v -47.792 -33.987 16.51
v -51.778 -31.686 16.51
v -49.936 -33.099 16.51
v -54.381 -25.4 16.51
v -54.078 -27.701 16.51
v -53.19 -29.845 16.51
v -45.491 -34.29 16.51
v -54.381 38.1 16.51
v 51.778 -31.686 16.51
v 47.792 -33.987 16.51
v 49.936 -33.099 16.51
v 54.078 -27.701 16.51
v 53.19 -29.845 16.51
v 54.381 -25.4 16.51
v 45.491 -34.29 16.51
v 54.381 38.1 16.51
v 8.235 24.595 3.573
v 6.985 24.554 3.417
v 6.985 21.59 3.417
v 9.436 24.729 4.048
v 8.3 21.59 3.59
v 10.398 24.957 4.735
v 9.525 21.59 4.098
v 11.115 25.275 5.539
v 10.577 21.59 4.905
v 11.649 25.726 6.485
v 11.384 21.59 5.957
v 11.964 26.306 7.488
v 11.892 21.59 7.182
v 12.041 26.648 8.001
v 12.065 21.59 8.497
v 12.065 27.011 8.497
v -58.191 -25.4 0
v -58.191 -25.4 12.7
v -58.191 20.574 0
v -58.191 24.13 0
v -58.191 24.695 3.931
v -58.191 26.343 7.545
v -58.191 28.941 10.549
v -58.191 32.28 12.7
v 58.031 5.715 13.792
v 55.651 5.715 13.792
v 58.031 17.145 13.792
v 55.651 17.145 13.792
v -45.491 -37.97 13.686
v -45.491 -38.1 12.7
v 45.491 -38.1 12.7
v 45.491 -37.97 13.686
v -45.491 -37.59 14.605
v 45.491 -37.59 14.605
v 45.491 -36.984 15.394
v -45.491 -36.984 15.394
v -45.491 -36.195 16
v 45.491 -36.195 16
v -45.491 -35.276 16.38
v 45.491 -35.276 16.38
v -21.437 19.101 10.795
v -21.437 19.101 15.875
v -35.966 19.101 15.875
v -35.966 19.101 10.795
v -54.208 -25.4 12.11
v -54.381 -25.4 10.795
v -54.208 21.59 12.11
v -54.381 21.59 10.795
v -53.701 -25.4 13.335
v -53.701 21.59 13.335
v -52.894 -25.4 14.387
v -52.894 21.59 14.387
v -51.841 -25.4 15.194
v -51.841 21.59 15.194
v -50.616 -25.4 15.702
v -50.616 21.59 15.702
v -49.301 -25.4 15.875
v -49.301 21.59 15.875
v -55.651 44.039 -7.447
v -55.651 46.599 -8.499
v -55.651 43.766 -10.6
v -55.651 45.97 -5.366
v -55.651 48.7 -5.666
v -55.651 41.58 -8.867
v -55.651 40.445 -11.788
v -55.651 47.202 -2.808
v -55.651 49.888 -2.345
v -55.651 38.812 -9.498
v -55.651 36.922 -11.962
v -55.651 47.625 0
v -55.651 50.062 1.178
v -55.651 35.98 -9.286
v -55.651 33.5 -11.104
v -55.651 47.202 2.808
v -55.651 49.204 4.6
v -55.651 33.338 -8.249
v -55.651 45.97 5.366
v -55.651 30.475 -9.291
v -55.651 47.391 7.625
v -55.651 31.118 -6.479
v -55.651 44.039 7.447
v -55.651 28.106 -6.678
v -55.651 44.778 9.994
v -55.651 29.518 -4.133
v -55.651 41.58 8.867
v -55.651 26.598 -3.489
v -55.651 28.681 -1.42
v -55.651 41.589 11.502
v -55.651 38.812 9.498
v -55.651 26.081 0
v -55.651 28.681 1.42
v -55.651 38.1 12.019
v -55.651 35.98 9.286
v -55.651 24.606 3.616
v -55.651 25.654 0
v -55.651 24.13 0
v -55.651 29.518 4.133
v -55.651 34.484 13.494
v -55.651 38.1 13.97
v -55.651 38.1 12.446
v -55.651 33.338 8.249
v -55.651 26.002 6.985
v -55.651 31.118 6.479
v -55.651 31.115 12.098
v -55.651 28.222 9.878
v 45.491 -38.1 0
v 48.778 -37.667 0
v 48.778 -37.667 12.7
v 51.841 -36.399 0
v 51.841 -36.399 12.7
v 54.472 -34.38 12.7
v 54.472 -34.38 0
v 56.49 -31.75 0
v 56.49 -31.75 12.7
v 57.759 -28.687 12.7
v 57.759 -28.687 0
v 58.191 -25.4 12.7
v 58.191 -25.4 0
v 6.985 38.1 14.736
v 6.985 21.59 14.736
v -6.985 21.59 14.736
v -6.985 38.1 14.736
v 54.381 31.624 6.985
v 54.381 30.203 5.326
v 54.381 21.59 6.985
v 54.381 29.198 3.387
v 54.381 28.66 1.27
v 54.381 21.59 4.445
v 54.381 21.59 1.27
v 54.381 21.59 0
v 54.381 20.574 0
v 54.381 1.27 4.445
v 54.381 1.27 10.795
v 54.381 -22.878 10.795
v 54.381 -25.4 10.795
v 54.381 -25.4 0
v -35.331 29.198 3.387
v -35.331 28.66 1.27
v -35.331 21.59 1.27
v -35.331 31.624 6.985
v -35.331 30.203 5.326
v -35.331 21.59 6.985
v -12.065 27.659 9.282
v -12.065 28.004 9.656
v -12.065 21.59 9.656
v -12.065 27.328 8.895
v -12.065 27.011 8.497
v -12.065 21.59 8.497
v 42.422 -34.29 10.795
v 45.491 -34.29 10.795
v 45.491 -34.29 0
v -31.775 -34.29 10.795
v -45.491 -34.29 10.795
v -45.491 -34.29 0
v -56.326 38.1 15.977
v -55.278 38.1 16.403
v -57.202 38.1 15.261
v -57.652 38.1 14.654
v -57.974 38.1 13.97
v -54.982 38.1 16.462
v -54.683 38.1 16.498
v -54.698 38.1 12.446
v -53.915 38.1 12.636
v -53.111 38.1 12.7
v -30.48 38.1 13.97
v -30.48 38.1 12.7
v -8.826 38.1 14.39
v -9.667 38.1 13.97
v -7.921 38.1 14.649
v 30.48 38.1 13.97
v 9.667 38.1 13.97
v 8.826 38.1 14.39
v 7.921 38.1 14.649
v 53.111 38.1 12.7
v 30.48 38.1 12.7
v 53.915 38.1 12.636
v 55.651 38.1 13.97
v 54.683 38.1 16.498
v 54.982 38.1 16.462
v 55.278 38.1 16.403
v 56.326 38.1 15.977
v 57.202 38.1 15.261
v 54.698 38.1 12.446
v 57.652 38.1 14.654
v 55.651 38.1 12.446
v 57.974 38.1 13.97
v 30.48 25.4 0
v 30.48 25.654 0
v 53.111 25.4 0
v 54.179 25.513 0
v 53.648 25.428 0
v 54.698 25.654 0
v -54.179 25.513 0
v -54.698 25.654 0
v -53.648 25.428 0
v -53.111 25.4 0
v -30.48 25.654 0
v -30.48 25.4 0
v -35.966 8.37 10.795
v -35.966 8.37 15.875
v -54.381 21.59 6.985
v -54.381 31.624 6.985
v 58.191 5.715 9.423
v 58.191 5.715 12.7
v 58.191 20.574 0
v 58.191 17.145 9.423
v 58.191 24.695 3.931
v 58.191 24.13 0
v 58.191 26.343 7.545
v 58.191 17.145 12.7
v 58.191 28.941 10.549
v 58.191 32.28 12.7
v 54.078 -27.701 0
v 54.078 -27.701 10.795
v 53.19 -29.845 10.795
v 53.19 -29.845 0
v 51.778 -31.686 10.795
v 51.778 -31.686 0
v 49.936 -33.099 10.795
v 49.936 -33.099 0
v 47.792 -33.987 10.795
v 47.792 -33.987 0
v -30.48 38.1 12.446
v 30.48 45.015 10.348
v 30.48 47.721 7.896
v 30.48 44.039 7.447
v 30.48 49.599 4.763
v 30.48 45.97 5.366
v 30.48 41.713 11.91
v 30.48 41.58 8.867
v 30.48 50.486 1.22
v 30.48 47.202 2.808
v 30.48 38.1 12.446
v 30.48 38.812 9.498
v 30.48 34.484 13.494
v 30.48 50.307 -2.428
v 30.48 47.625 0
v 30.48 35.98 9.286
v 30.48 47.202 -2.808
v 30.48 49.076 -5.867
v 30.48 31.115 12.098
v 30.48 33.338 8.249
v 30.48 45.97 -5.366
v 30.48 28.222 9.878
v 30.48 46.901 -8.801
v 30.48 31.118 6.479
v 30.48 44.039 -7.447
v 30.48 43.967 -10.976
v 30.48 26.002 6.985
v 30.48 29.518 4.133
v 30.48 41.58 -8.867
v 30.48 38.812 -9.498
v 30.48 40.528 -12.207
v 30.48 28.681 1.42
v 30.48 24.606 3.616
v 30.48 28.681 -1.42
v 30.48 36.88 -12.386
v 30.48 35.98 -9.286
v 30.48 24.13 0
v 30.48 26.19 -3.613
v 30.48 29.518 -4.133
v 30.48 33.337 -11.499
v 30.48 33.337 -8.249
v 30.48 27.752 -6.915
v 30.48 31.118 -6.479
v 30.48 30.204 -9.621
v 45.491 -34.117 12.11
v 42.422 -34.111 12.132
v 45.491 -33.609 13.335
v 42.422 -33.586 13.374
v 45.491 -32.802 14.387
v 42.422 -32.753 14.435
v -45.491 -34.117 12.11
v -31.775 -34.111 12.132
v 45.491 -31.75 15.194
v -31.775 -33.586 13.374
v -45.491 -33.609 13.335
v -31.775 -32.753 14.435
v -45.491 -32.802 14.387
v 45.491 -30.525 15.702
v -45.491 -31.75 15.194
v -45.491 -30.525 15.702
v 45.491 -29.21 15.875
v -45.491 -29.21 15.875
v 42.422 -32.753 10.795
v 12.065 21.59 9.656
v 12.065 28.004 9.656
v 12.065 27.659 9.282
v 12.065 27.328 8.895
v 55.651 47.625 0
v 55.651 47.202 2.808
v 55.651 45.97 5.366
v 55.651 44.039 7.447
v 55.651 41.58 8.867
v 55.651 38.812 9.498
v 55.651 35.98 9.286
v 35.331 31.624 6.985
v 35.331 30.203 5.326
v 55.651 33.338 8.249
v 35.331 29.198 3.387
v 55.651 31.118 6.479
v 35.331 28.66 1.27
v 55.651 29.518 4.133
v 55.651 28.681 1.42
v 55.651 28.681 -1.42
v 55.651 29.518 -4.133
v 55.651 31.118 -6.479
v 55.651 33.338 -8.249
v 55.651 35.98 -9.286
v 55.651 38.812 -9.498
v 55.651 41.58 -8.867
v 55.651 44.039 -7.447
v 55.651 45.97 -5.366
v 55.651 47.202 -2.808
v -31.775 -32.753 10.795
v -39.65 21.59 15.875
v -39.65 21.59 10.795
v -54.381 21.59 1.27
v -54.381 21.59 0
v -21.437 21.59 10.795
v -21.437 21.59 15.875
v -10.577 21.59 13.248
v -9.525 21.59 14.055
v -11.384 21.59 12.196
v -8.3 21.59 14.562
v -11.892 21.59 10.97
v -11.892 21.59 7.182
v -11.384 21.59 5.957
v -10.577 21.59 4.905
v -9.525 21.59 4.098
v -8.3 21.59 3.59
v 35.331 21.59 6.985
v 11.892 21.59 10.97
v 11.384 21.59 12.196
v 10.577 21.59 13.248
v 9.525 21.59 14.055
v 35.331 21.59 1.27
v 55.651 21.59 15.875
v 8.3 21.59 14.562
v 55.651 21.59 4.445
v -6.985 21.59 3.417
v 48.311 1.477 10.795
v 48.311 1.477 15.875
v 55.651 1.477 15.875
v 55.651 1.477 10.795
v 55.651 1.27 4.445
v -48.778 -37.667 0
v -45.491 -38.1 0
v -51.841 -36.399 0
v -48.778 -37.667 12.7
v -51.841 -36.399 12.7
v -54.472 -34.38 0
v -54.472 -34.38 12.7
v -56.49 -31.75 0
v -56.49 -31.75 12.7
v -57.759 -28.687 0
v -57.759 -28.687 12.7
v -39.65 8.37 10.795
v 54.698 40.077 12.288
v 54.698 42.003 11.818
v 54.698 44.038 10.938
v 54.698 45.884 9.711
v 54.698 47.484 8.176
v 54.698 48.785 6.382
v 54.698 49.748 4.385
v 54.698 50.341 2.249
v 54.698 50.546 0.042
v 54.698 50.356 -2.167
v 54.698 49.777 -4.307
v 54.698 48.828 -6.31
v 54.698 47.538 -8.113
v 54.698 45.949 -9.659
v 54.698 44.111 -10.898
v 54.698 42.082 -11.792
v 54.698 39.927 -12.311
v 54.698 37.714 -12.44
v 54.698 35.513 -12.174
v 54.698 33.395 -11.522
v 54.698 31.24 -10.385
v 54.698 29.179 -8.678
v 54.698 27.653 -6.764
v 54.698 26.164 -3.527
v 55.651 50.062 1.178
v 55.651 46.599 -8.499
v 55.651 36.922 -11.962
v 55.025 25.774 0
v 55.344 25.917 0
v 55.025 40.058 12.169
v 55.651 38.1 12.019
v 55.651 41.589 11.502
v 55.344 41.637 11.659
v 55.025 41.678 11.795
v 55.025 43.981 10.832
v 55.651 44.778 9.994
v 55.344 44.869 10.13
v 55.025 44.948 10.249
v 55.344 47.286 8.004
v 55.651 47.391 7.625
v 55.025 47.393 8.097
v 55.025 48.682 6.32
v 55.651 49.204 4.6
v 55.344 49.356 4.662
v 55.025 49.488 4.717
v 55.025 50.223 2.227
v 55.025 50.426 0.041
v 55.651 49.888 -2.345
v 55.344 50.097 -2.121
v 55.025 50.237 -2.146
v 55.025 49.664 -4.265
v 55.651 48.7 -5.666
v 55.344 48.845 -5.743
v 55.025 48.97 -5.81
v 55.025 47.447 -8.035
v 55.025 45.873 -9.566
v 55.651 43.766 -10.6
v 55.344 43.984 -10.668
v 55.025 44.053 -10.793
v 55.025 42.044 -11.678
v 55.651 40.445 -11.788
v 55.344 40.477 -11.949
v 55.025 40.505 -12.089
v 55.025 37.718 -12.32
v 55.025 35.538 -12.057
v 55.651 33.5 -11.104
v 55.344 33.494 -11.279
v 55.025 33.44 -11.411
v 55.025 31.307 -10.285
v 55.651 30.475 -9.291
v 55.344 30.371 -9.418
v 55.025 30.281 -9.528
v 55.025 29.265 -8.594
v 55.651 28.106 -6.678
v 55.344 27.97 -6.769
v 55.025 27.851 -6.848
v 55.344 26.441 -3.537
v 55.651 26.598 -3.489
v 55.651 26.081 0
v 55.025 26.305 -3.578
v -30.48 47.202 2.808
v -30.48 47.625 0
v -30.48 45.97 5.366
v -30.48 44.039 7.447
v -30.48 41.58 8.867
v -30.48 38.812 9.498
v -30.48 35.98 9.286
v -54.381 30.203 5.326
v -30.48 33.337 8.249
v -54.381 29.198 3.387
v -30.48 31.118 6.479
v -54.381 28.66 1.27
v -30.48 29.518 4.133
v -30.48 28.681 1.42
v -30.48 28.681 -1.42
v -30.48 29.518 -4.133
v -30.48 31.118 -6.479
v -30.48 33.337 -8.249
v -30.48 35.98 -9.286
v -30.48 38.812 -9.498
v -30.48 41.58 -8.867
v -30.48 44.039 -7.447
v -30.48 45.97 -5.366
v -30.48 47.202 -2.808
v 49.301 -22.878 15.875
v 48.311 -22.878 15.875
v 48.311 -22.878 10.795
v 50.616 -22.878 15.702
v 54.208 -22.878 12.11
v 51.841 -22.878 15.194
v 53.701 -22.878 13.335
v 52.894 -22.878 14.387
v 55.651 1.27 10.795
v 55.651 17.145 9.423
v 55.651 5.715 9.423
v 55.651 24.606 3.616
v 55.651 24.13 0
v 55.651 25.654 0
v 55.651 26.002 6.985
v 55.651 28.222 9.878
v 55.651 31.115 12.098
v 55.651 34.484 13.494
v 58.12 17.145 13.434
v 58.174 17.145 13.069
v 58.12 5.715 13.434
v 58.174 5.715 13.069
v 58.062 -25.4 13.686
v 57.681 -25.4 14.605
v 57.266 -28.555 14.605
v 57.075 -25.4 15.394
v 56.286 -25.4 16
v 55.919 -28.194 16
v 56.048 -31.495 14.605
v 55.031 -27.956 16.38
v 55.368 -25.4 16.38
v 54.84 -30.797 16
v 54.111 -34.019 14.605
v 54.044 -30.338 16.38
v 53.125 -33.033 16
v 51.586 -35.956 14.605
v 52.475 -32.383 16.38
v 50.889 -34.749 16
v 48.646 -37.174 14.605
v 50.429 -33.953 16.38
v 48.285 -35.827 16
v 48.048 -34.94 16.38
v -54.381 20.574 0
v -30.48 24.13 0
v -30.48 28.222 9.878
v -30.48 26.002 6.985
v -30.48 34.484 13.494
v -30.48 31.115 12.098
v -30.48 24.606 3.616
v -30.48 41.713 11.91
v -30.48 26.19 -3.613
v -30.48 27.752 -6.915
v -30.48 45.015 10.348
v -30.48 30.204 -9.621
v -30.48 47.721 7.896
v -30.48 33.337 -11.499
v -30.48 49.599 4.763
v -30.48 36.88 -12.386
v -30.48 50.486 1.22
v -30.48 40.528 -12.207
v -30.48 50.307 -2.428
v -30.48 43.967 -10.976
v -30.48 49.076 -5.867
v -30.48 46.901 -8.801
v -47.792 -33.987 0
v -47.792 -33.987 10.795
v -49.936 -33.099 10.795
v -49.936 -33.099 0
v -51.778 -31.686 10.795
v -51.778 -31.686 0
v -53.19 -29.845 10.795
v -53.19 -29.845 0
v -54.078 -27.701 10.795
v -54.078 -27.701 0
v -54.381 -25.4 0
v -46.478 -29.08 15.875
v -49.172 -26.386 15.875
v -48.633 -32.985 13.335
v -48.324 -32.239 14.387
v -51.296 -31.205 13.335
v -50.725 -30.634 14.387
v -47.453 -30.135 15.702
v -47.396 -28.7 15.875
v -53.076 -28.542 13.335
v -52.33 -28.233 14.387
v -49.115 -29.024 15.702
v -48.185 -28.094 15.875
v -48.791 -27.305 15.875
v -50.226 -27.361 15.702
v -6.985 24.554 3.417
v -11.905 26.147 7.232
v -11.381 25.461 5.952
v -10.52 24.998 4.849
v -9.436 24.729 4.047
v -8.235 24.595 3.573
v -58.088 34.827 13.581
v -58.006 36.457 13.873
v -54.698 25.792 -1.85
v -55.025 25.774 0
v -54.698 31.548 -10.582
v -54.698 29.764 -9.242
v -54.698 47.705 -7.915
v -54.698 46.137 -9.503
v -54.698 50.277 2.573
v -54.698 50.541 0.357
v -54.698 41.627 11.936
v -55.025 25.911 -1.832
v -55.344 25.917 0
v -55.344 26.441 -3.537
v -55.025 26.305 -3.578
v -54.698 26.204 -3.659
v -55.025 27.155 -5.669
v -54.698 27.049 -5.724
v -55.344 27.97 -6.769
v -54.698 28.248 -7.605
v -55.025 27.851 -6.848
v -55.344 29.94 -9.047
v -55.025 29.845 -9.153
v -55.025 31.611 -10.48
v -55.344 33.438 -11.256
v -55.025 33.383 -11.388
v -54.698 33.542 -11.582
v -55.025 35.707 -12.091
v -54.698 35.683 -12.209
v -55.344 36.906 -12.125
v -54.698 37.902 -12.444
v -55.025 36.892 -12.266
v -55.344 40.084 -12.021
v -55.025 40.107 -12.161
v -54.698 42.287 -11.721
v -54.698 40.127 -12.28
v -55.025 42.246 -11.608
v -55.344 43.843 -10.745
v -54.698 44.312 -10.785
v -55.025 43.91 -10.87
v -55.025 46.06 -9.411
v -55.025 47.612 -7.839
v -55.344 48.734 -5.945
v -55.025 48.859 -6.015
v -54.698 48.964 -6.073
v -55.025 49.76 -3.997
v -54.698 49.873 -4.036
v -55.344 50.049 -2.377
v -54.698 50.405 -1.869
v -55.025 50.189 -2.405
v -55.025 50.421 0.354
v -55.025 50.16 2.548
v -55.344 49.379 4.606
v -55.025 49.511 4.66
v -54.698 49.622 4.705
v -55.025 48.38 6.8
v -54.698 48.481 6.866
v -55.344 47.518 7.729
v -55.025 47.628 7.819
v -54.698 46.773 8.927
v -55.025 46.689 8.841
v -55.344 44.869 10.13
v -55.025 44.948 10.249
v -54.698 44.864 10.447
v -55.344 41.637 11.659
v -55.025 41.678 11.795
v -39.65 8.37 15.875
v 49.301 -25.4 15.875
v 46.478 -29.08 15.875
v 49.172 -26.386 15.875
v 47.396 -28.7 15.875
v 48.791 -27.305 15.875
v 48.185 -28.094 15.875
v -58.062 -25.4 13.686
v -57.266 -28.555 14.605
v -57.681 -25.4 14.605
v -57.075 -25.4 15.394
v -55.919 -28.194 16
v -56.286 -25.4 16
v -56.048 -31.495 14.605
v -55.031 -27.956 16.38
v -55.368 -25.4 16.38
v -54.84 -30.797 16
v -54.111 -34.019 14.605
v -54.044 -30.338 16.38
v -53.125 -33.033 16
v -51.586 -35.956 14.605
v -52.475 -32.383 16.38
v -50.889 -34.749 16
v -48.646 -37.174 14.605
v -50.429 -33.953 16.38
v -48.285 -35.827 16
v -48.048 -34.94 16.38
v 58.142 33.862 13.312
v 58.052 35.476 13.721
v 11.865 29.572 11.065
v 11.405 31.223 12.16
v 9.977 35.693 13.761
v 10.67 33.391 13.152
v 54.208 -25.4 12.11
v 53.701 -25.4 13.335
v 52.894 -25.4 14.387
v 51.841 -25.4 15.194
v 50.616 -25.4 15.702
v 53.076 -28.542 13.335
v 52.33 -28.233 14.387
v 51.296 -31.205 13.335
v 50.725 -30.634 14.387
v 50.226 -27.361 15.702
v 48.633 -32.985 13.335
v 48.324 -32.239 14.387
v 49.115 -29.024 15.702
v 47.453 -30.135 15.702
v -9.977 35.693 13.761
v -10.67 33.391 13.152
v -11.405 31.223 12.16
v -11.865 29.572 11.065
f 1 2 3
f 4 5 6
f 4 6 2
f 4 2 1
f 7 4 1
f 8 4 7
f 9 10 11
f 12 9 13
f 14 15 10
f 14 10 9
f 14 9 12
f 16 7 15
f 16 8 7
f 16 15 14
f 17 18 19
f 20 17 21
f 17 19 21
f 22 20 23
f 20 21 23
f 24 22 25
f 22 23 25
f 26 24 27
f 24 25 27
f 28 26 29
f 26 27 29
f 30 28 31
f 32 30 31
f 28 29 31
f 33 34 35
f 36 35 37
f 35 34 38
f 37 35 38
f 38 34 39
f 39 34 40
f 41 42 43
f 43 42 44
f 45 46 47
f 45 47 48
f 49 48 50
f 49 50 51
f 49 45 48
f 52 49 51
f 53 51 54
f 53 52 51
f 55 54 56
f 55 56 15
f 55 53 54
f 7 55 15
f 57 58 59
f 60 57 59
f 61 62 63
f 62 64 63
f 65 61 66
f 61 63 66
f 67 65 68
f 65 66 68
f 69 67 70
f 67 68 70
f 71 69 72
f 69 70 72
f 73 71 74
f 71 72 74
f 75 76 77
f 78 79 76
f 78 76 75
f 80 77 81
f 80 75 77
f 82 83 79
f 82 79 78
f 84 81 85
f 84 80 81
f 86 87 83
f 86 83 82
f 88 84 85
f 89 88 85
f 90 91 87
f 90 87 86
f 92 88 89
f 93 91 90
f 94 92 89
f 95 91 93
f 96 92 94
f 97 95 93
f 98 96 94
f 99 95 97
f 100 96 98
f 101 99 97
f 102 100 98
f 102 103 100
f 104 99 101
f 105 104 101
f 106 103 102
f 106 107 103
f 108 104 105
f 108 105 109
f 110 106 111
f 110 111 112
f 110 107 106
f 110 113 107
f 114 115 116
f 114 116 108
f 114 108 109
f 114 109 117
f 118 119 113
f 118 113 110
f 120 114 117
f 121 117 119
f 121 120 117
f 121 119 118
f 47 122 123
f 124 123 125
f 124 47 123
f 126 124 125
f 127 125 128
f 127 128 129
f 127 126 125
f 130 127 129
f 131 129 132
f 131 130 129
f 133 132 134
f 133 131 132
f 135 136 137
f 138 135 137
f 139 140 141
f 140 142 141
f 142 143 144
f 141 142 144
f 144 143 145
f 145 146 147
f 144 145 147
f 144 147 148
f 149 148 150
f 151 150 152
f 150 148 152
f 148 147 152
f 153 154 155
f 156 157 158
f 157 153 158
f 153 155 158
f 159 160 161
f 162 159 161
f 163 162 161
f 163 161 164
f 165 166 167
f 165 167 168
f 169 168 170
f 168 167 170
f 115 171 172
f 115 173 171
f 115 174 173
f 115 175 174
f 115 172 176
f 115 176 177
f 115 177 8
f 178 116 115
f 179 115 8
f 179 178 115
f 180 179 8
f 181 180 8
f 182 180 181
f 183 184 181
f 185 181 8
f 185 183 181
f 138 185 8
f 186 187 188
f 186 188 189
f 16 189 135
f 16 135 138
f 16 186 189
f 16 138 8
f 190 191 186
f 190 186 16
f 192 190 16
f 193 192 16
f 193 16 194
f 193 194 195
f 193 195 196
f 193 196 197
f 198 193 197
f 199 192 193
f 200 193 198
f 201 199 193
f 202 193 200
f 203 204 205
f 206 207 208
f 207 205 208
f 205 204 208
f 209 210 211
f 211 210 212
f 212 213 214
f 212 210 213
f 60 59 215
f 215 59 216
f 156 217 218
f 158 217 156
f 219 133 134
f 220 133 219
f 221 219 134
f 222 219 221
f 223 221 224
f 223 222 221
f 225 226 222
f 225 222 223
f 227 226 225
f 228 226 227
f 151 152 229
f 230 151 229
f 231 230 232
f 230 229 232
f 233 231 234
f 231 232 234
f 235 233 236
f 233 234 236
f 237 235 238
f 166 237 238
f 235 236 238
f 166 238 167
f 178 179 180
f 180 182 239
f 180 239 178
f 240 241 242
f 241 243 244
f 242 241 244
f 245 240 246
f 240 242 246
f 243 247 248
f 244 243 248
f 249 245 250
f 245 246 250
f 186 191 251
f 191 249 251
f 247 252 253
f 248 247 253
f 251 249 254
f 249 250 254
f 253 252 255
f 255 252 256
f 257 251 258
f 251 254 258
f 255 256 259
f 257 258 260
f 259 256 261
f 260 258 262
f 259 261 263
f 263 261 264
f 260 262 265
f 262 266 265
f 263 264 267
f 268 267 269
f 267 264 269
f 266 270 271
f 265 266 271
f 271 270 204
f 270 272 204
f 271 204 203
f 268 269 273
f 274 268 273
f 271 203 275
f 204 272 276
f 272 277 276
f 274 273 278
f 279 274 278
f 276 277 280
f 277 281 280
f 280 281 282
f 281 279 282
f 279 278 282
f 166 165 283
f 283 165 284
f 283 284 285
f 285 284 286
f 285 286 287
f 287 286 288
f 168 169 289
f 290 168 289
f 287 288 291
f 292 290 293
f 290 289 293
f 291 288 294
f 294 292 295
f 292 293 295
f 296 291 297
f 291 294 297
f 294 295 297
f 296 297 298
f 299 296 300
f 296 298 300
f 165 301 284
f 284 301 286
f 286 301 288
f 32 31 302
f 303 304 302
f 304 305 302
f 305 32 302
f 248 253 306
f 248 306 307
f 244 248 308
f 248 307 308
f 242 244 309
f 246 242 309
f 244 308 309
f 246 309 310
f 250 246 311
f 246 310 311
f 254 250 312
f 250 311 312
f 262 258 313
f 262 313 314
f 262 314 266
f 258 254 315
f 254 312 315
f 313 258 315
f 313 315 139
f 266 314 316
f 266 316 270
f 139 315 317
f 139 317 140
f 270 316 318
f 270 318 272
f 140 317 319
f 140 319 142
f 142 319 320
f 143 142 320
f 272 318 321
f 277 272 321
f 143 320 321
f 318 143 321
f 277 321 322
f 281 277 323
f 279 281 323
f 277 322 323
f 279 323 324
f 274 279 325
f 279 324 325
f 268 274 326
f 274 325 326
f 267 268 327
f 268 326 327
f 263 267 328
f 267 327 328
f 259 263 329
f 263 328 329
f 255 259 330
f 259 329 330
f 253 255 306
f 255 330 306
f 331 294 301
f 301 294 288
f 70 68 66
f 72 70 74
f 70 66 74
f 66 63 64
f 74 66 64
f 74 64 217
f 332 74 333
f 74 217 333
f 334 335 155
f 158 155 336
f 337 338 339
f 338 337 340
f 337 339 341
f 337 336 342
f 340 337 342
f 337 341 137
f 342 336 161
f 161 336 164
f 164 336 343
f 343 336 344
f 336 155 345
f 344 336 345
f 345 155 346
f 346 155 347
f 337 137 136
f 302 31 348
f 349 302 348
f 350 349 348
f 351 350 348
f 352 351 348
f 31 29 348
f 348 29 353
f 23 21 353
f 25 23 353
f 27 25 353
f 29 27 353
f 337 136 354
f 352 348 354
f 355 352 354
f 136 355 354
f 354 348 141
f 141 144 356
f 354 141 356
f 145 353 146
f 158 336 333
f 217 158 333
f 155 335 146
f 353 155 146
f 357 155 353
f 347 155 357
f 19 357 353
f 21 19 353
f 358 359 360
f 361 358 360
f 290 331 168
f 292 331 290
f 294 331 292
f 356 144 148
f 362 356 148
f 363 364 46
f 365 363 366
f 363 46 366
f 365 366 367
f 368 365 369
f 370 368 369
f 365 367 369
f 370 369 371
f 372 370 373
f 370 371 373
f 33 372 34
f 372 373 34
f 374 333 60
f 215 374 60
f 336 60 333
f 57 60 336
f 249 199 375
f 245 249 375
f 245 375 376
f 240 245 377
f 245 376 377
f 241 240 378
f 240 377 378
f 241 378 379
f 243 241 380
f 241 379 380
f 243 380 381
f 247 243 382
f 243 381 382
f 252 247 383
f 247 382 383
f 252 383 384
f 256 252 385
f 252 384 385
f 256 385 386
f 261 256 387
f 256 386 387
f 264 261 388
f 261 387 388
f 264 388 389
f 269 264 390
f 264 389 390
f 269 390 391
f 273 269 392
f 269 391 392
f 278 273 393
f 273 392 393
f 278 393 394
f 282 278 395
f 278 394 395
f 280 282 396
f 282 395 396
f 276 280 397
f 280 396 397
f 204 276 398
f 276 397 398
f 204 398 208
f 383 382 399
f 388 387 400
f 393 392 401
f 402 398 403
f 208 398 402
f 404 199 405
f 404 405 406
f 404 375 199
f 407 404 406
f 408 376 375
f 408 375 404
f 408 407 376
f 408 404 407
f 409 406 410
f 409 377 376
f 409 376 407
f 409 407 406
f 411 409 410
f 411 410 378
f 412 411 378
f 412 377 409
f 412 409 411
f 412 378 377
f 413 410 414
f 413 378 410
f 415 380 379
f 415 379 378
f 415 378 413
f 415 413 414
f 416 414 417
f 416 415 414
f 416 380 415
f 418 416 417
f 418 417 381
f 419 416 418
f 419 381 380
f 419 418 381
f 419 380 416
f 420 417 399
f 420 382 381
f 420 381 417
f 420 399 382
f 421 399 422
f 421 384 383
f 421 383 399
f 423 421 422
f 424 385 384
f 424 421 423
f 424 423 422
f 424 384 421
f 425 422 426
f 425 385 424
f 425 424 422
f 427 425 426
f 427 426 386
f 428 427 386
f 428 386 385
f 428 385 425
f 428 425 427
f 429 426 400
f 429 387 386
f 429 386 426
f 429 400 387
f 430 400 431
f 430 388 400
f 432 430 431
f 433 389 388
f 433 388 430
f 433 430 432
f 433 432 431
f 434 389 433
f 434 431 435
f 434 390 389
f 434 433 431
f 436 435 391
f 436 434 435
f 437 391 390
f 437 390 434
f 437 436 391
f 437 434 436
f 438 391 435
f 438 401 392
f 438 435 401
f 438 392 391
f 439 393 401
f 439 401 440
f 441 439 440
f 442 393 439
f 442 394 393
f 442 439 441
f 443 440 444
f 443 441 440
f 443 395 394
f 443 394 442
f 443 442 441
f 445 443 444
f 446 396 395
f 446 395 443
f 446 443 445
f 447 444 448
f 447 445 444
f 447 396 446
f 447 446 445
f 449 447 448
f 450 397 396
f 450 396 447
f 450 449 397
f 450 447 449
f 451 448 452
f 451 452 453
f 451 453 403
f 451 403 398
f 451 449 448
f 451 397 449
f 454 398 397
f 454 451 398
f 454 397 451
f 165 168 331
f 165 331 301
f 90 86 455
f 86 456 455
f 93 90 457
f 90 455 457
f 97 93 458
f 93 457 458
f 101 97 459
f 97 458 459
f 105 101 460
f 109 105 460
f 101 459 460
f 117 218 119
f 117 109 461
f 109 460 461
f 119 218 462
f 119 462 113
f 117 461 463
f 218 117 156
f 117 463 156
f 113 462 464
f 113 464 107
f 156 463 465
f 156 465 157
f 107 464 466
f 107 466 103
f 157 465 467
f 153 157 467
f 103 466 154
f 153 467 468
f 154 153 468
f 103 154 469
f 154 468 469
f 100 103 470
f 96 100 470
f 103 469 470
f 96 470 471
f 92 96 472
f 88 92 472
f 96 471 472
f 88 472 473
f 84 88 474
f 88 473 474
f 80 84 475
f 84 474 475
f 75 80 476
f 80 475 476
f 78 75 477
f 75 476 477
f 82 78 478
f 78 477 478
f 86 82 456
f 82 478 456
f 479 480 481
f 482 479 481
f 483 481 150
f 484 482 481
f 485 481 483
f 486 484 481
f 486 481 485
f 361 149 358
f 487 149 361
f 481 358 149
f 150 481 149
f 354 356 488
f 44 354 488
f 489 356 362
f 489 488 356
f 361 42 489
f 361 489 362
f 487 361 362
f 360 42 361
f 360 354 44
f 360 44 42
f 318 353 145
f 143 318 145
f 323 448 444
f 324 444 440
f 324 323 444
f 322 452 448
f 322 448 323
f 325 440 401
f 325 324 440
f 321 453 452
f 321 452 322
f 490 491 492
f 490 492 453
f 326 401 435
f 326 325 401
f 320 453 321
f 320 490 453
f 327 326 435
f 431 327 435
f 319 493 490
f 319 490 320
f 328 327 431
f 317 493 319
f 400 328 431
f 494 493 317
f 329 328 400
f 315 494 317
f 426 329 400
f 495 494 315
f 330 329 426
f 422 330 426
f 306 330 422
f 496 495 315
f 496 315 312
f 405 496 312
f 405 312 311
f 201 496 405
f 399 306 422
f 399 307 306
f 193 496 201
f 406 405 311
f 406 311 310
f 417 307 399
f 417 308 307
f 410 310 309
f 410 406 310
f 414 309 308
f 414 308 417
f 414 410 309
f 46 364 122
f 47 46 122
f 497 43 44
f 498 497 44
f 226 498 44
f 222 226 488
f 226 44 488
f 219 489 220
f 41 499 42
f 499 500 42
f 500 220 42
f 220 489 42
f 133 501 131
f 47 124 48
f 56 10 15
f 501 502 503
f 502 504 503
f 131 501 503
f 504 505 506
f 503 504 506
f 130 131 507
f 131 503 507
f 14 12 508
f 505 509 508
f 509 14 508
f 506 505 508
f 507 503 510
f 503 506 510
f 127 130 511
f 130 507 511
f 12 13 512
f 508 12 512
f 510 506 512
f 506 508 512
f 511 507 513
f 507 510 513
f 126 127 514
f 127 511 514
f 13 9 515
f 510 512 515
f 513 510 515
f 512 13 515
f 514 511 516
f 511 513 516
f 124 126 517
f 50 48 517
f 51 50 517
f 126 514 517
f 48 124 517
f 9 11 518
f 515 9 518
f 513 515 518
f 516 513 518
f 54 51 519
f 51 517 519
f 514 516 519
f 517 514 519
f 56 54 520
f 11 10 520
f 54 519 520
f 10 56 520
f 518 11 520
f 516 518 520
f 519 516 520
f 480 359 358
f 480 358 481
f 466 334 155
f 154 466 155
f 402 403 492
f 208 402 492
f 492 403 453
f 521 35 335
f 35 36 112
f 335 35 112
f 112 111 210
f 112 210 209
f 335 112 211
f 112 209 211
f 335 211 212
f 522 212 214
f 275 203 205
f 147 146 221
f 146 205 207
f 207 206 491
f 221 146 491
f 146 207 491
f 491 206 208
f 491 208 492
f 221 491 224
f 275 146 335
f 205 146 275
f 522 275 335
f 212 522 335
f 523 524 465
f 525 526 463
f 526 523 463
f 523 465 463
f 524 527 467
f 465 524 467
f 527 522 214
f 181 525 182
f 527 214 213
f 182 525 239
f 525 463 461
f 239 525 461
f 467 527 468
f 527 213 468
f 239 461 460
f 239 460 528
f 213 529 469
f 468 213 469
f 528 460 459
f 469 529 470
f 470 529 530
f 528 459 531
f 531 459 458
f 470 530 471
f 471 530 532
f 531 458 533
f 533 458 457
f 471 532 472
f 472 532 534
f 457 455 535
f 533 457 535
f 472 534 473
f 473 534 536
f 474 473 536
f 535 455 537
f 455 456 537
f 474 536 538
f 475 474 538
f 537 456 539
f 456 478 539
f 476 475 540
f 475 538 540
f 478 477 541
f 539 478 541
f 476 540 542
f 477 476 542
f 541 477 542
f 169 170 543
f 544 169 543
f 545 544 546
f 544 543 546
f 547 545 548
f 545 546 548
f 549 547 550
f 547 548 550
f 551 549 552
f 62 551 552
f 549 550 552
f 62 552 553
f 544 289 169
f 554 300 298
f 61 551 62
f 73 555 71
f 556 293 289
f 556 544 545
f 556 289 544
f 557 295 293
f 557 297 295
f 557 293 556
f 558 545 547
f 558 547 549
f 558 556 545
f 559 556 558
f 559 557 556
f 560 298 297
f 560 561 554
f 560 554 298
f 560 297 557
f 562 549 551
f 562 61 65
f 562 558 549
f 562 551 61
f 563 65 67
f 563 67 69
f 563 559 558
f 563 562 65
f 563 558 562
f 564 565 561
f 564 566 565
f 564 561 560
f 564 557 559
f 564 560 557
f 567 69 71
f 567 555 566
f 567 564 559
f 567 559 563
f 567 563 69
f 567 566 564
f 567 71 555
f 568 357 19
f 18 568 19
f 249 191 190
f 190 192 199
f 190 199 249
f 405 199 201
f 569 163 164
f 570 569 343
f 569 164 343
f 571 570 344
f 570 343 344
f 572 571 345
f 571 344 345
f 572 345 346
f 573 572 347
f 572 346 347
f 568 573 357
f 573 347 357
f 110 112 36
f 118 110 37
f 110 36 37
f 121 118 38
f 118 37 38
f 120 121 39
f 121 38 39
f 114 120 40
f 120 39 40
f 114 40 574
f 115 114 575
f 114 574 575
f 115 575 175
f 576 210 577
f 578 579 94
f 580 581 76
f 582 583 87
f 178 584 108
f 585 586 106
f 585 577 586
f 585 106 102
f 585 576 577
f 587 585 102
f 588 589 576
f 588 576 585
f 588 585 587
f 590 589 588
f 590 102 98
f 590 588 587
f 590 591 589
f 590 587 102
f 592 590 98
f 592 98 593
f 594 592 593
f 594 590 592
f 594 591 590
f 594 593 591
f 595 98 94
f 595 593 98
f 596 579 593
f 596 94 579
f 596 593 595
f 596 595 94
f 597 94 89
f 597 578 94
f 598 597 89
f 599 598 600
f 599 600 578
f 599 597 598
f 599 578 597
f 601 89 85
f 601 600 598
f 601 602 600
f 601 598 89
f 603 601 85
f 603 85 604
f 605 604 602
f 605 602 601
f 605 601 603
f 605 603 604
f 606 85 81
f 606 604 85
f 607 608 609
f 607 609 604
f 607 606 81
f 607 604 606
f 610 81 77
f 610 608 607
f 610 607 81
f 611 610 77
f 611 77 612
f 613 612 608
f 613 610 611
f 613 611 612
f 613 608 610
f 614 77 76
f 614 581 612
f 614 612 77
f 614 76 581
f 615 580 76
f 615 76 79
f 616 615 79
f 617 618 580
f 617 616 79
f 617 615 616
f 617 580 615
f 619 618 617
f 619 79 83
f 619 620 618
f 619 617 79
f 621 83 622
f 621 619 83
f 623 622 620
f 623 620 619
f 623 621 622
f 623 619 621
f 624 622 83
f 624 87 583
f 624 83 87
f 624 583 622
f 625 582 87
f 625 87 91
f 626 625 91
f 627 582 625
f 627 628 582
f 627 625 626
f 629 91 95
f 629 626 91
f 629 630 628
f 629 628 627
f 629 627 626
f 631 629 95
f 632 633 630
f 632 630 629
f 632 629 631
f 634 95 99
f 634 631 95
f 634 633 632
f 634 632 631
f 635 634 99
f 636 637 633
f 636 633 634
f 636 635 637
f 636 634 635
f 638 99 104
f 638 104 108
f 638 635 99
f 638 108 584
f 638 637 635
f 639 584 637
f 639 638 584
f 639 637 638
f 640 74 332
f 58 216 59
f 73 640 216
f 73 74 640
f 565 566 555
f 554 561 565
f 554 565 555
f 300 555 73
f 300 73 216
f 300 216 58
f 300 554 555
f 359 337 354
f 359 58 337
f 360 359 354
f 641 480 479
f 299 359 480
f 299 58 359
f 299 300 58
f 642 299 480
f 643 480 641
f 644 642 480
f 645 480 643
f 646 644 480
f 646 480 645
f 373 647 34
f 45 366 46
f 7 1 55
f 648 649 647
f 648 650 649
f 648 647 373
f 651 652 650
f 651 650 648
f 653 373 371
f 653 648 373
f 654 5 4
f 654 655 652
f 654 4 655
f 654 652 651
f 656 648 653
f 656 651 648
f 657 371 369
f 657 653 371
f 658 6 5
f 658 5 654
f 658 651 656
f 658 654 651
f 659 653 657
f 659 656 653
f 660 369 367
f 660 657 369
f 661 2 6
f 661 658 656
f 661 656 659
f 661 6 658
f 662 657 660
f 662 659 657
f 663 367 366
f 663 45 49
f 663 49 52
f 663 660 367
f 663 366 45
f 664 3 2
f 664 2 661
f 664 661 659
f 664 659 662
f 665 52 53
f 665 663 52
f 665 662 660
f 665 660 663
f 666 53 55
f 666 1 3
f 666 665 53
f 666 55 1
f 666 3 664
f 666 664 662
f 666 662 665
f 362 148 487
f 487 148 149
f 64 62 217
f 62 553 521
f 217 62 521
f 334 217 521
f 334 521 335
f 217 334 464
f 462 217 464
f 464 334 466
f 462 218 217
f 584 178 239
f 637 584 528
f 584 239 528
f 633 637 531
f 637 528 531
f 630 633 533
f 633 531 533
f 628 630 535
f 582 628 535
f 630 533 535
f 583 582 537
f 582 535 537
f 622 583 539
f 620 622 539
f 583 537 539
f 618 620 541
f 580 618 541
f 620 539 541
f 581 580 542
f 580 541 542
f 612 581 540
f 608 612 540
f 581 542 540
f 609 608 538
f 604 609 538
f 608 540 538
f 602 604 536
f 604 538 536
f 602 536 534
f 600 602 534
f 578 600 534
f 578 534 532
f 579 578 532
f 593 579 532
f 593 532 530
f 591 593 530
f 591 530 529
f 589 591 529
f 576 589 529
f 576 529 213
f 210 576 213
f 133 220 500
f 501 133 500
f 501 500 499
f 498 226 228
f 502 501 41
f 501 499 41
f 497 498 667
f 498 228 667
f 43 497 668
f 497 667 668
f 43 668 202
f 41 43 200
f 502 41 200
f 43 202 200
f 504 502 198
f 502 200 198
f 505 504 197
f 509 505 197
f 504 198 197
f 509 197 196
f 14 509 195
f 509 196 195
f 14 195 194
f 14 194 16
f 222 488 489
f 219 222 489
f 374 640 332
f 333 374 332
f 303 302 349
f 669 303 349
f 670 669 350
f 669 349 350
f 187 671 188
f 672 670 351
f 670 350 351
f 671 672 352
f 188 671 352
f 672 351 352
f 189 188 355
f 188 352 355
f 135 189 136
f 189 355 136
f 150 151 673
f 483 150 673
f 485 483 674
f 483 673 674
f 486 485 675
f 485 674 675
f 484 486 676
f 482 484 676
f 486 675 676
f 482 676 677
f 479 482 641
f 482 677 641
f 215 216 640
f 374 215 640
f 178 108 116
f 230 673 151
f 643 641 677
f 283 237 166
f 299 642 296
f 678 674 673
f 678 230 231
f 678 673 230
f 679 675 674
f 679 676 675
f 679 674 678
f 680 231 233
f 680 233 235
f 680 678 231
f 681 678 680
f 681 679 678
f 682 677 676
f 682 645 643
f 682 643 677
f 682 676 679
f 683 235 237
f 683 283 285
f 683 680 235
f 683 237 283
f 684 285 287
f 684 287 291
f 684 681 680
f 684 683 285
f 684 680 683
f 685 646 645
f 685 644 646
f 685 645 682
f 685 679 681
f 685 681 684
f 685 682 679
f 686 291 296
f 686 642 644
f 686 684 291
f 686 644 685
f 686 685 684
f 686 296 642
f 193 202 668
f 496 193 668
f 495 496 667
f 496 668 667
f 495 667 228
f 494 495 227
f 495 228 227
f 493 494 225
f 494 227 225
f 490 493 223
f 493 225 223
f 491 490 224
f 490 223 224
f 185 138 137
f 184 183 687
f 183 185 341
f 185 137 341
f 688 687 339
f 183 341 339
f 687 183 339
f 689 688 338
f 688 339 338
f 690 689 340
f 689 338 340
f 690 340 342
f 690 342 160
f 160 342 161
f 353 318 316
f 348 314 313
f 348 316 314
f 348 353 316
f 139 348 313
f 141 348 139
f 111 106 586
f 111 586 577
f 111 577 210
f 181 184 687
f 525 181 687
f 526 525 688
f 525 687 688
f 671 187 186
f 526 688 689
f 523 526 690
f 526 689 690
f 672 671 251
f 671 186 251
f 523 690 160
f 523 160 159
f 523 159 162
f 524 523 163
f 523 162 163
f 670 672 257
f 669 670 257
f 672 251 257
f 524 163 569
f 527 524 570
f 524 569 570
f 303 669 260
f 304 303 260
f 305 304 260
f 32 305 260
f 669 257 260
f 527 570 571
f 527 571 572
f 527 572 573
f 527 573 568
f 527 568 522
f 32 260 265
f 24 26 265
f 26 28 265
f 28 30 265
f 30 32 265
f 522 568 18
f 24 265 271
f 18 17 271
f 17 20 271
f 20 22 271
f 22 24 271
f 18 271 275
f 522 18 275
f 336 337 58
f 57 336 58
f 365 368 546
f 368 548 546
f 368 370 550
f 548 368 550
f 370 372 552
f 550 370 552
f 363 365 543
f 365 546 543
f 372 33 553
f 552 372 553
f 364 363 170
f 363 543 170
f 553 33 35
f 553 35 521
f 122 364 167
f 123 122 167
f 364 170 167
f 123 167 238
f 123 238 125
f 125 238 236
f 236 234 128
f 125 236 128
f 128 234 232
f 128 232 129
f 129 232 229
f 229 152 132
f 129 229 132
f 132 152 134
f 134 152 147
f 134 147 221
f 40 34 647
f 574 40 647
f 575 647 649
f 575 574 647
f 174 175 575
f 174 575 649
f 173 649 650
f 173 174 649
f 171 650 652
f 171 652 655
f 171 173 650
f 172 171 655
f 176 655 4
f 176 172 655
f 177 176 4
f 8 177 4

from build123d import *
from build123d import SkipClean  # not in build123d's __all__

# Parameters (mm, degrees)
F0_W           = 116.3828
F0_H           = 76.2
F1_DEPTH       = 16.51
F2_R           = 12.7
F3_DEPTH       = 58.1914
F4_R           = 12.7
F6_DEPTH       = 15.875
F7_R           = 6.985
F10_DEPTH      = 53.34
F10_DEPTH_BACK = 53.34
F11_W          = 19.05
F11_H          = 5.715
F12_DEPTH      = 17.78
F13_W          = 20.32
F13_H          = 11.43
F14_DEPTH      = 1.27
F16_DEPTH      = 25.4
F17_R          = 5.08
F18_W          = 7.9625188272
F18_H          = 24.355364847
F18_W_2        = 74.197281152
F18_H_2        = 2.5465525687
F19_DEPTH      = 5.08
F20_T1_DEPTH   = 73.025
F20_T3_DEPTH   = 90.9828
F20_T6_ANGLE   = 90
F20_T8_ANGLE   = 90
F21_R          = 5.08
F22_R          = 13.97
F23_DEPTH      = 2.54
F24_R          = 13.97
F25_DEPTH      = 2.54
F26_R          = 9.525
F27_DEPTH      = 63.5
F29_DEPTH      = 25.4
F31_DEPTH      = 63.5


# Not quite as in the source:
# - a fillet or chamfer that OpenCascade refuses, or shapes differently, is made with other operations: its cross-section is extruded or revolved along the edge and cut away or added


with BuildPart() as f1:
    # F0 (on Top) → F1 (new body)
    with BuildSketch(Plane.XY):
        Rectangle(F0_W, F0_H)
    extrude(amount=F1_DEPTH)

    # F2 (on Right) → F3 (join, symmetric)
    with BuildSketch(Plane.YZ):
        with Locations((38.1, 0)):
            Circle(F2_R)
    extrude(amount=F3_DEPTH, both=True)

    # F4
    f4_edges = [f1.edges().sort_by_distance(p)[0] for p in [
        (-58.1914, -38.1, 8.255),
        (58.1914, -38.1, 8.255),
    ]]
    fillet(f4_edges, radius=F4_R)

    # F5 (on face) → F6 (cut)
    with BuildSketch(Plane(origin=(0, 0, 0), x_dir=(1, 0, 0), z_dir=(0, 0, -1))):
        with BuildLine():
            Line((-54.3814, 25.4), (-54.3814, -21.59))
            Line((-54.3814, -21.59), (54.3814, -21.59))
            Line((54.3814, -21.59), (54.3814, 25.4))
            ThreePointArc((54.3814, 25.4), (51.7775792847, 31.6861792847), (45.4914, 34.29))
            Line((45.4914, 34.29), (-45.4914, 34.29))
            ThreePointArc((-45.4914, 34.29), (-51.7775792847, 31.6861792847), (-54.3814, 25.4))
        make_face()
    extrude(amount=-F6_DEPTH, mode=Mode.SUBTRACT)

    # F8 (on Top) → F9 (revolve, cut)
    with BuildSketch(Plane.XY):
        Polygon((-30.48, 28.575), (-30.48, 25.4), (-30.48, 24.13), (30.48, 24.13), (30.48, 25.4), (30.48, 28.575), (24.13, 28.575), (19.05, 28.575), (19.05, 38.1), (0, 38.1), (-19.05, 38.1), (-19.05, 28.575), (-24.13, 28.575), align=None)
    revolve(axis=Axis((-9.525, 38.1, 0), (1, 0, 0)), mode=Mode.SUBTRACT)

    # F7 (on Right) → F10 (cut, two sides)
    with BuildSketch(Plane.YZ) as f10_sk:
        with Locations((38.1, 0)):
            Circle(F7_R)
    extrude(amount=F10_DEPTH, mode=Mode.SUBTRACT)
    extrude(f10_sk.sketch, amount=-F10_DEPTH_BACK, mode=Mode.SUBTRACT)

    # F11 (on face) → F12 (cut)
    with BuildSketch(Plane.XZ.offset(-21.59)):
        with Locations((44.8564, 4.1275)):
            Rectangle(F11_W, F11_H)
        with Locations((-44.8564, 4.1275)):
            Rectangle(F11_W, F11_H)
    extrude(amount=-F12_DEPTH, mode=Mode.SUBTRACT)

    # F13 (on face) → F14 (cut)
    with BuildSketch(Plane(origin=(54.3814, 0, 0), x_dir=(0, -1, 0), z_dir=(-1, 0, 0))):
        with Locations((-11.43, 10.16)):
            Rectangle(F13_W, F13_H)
    extrude(amount=-F14_DEPTH, mode=Mode.SUBTRACT)

    # F15 (on face) → F16 (cut)
    with BuildSketch(Plane(origin=(55.6514, 0, 0), x_dir=(0, -1, 0), z_dir=(-1, 0, 0))):
        Polygon((-17.145, 9.4234), (-5.715, 9.4234), (-5.715, 13.7922), (-11.43, 13.7922), (-17.145, 13.7922), align=None)
    extrude(amount=-F16_DEPTH, mode=Mode.SUBTRACT)

    # F17
    f17_edges = [f1.edges().sort_by_distance(p)[0] for p in [
        (-54.3814, -1.905, 15.875),
    ]]
    fillet(f17_edges, radius=F17_R)

    # F18 (on face) → F19 (join)
    with BuildSketch(Plane(origin=(0, 0, 15.875), x_dir=(1, 0, 0), z_dir=(0, 0, -1))):
        with Locations((52.2920594136, 10.7005844475)):
            Rectangle(F18_W, F18_H)
        Polygon((-35.9664, -19.1008), (-35.9664, -8.3696618676), (-39.6496931181, -8.3696618676), (-39.6496931181, -22.3802613997), (-21.43734819, -22.3802613997), (-21.43734819, -19.1008), align=None)
        with Locations((5.3238477558, 34.0265762843)):
            Rectangle(F18_W_2, F18_H_2)
    extrude(amount=F19_DEPTH)

    # F20: fillet of radius 3.81 on 1 edges, made by hand

    # F20_s2 → F20_t1 (cut)
    with BuildSketch(Plane.XZ.offset(-47.625)):
        with BuildLine():
            ThreePointArc((-58.1914, 12.7), (-57.0754768363, 15.3940768363), (-54.3814, 16.51))
            Line((-54.3814, 16.51), (-58.1914, 16.51))
            Line((-58.1914, 16.51), (-58.1914, 12.7))
        make_face()
        with BuildLine():
            ThreePointArc((58.1914, 12.7), (57.0754768363, 15.3940768363), (54.3814, 16.51))
            Line((54.3814, 16.51), (58.1914, 16.51))
            Line((58.1914, 16.51), (58.1914, 12.7))
        make_face()
    extrude(amount=F20_T1_DEPTH, mode=Mode.SUBTRACT)

    # F20_s4 → F20_t3 (cut)
    with BuildSketch(Plane.YZ.offset(-45.4914)):
        with BuildLine():
            ThreePointArc((-38.1, 12.7), (-36.9840768363, 15.3940768363), (-34.29, 16.51))
            Line((-34.29, 16.51), (-38.1, 16.51))
            Line((-38.1, 16.51), (-38.1, 12.7))
        make_face()
    extrude(amount=F20_T3_DEPTH, mode=Mode.SUBTRACT)

    # F20_s5 → F20_t6 (revolve, cut)
    with BuildSketch(Plane.XZ.offset(25.4)):
        with BuildLine():
            ThreePointArc((-58.1914, 12.7), (-57.0754768363, 15.3940768363), (-54.3814, 16.51))
            Line((-54.3814, 16.51), (-58.1914, 16.51))
            Line((-58.1914, 16.51), (-58.1914, 12.7))
        make_face()
    revolve(axis=Axis((-45.4914, -25.4, 16.51), (0, 0, 1)), revolution_arc=F20_T6_ANGLE, mode=Mode.SUBTRACT)

    # F20_s7 → F20_t8 (revolve, cut)
    with BuildSketch(Plane.XZ.offset(25.4)):
        with BuildLine():
            ThreePointArc((58.1914, 12.7), (57.0754768363, 15.3940768363), (54.3814, 16.51))
            Line((54.3814, 16.51), (58.1914, 16.51))
            Line((58.1914, 16.51), (58.1914, 12.7))
        make_face()
    revolve(axis=Axis((45.4914, -25.4, 16.51), (0, 0, -1)), revolution_arc=F20_T8_ANGLE, mode=Mode.SUBTRACT)

    # F21
    f21_edges = [f1.edges().sort_by_distance(p)[0] for p in [
        (58.1914, 47.080256, -8.980256),
        (-58.1914, 47.080256, -8.980256),
    ]]
    fillet(f21_edges, radius=F21_R)

    # F22 (on face) → F23 (cut)
    with BuildSketch(Plane(origin=(-58.1914, 0, 0), x_dir=(0, -1, 0), z_dir=(-1, 0, 0))):
        with Locations((-38.1, 0)):
            Circle(F22_R)
    extrude(amount=-F23_DEPTH, mode=Mode.SUBTRACT)

    # F24 (on face) → F25 (cut)
    with BuildSketch(Plane.YZ.offset(58.1914)):
        with Locations((38.1, 0)):
            Circle(F24_R)
    extrude(amount=-F25_DEPTH, mode=Mode.SUBTRACT)

    # F26 (on Right) → F27 (cut, symmetric)
    with BuildSketch(Plane.YZ):
        with Locations((38.1, 0)):
            Circle(F26_R)
    extrude(amount=F27_DEPTH, both=True, mode=Mode.SUBTRACT)

    # F28 (on face) → F29 (cut)
    with BuildSketch(Plane.XZ.offset(-21.59)):
        with BuildLine():
            ThreePointArc((12.065, 9.6555790053), (10.5771024484, 13.2476814537), (6.985, 14.7355790053))
            Line((6.985, 14.7355790053), (-6.985, 14.7355790053))
            ThreePointArc((-6.985, 14.7355790053), (-10.5771024484, 13.2476814537), (-12.065, 9.6555790053))
            Line((-12.065, 9.6555790053), (-12.065, 8.4972062227))
            ThreePointArc((-12.065, 8.4972062227), (-10.5771024484, 4.9051037742), (-6.985, 3.4172062227))
            Line((-6.985, 3.4172062227), (6.985, 3.4172062227))
            ThreePointArc((6.985, 3.4172062227), (10.5771024484, 4.9051037742), (12.065, 8.4972062227))
            Line((12.065, 8.4972062227), (12.065, 9.6555790053))
        make_face()
    extrude(amount=-F29_DEPTH, mode=Mode.SUBTRACT)

    # F30 (on Right) → F31 (cut, symmetric)
    with BuildSketch(Plane.YZ):
        with BuildLine():
            ThreePointArc((38.1, 12.446), (46.9006509986, -8.8006509986), (25.654, 0))
            Line((25.654, 0), (20.574, 0))
            Line((20.574, 0), (20.574, -20.574))
            Line((20.574, -20.574), (58.674, -20.574))
            Line((58.674, -20.574), (58.674, 17.526))
            Line((58.674, 17.526), (38.1, 17.526))
            Line((38.1, 17.526), (38.1, 12.446))
        make_face()
    with SkipClean():  # cleaning this boolean's faces spoils the solid; the shape is the same uncleaned
        extrude(amount=F31_DEPTH, both=True, mode=Mode.SUBTRACT)


solid = f1.part
